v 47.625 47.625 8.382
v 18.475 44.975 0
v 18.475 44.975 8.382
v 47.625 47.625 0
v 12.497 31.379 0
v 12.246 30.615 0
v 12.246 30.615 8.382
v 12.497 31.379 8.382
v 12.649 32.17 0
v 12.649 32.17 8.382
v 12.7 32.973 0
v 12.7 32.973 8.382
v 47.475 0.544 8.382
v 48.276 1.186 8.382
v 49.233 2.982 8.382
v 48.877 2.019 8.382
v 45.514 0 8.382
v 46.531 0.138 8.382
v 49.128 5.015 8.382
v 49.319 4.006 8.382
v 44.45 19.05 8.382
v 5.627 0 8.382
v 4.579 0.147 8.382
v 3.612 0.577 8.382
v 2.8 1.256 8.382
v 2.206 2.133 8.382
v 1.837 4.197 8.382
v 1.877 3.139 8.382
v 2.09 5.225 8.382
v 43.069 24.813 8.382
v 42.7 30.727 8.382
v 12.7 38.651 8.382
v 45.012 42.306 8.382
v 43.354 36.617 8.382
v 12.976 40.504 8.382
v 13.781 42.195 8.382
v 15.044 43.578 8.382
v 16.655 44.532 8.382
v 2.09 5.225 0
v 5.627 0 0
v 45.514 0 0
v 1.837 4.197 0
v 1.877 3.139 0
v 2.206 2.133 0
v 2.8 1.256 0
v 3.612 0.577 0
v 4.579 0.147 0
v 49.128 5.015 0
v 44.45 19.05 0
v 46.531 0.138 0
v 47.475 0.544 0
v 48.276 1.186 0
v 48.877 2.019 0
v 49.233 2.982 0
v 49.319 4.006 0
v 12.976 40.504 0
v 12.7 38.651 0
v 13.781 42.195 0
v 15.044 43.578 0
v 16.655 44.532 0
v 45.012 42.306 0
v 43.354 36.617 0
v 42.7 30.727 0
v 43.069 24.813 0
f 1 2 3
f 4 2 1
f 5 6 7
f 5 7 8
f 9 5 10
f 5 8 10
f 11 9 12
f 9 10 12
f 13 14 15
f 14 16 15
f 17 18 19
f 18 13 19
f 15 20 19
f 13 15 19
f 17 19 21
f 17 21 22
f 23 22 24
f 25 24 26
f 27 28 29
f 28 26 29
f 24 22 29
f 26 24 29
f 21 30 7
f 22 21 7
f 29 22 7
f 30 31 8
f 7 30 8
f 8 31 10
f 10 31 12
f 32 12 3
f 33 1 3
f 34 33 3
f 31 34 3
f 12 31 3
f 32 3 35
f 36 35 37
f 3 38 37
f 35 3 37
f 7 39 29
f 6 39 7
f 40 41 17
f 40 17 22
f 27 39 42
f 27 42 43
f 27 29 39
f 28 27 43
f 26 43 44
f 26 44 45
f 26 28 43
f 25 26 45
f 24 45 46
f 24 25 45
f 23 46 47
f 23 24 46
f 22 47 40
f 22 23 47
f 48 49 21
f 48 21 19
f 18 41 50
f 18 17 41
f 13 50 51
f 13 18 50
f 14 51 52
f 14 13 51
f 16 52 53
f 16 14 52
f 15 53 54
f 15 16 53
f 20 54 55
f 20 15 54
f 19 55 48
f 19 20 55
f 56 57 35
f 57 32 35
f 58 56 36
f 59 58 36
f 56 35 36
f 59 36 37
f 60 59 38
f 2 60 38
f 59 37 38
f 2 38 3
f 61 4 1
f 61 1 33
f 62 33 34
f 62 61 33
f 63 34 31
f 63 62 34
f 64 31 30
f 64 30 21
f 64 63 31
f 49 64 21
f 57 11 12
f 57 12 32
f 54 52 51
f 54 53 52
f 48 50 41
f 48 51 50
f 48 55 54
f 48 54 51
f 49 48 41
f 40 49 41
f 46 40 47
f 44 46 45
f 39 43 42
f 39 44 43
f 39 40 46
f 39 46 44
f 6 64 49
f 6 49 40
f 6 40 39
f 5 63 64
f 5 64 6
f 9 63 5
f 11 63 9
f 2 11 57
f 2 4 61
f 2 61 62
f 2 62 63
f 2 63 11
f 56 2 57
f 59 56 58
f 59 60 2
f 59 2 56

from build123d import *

# Parameters (mm, degrees)
EXTRUDE1_DEPTH = 8.382
FILLET1_R      = 6.35
FILLET2_R      = 3.81


with BuildPart() as part:
    # Sketch1 → Extrude1 (new body)
    with BuildSketch(Plane.XY):
        with BuildLine():
            Line((0, 0), (12.7, 31.75))
            Line((12.7, 31.75), (12.7, 44.45))
            Line((12.7, 44.45), (47.625, 47.625))
            ThreePointArc((47.625, 47.625), (42.899438593, 33.68617349), (44.45, 19.05))
            Line((44.45, 19.05), (50.8, 0))
            Line((50.8, 0), (0, 0))
        make_face()
    extrude(amount=EXTRUDE1_DEPTH)

    # Fillet1
    fillet1_edges = [part.edges().sort_by_distance(p)[0] for p in [
        (12.7, 31.75, 4.191),
        (12.7, 44.45, 4.191),
    ]]
    fillet(fillet1_edges, radius=FILLET1_R)

    # Fillet2
    fillet2_edges = [part.edges().sort_by_distance(p)[0] for p in [
        (0, 0, 4.191),
        (50.8, 0, 4.191),
    ]]
    fillet(fillet2_edges, radius=FILLET2_R)


solid = part.part
